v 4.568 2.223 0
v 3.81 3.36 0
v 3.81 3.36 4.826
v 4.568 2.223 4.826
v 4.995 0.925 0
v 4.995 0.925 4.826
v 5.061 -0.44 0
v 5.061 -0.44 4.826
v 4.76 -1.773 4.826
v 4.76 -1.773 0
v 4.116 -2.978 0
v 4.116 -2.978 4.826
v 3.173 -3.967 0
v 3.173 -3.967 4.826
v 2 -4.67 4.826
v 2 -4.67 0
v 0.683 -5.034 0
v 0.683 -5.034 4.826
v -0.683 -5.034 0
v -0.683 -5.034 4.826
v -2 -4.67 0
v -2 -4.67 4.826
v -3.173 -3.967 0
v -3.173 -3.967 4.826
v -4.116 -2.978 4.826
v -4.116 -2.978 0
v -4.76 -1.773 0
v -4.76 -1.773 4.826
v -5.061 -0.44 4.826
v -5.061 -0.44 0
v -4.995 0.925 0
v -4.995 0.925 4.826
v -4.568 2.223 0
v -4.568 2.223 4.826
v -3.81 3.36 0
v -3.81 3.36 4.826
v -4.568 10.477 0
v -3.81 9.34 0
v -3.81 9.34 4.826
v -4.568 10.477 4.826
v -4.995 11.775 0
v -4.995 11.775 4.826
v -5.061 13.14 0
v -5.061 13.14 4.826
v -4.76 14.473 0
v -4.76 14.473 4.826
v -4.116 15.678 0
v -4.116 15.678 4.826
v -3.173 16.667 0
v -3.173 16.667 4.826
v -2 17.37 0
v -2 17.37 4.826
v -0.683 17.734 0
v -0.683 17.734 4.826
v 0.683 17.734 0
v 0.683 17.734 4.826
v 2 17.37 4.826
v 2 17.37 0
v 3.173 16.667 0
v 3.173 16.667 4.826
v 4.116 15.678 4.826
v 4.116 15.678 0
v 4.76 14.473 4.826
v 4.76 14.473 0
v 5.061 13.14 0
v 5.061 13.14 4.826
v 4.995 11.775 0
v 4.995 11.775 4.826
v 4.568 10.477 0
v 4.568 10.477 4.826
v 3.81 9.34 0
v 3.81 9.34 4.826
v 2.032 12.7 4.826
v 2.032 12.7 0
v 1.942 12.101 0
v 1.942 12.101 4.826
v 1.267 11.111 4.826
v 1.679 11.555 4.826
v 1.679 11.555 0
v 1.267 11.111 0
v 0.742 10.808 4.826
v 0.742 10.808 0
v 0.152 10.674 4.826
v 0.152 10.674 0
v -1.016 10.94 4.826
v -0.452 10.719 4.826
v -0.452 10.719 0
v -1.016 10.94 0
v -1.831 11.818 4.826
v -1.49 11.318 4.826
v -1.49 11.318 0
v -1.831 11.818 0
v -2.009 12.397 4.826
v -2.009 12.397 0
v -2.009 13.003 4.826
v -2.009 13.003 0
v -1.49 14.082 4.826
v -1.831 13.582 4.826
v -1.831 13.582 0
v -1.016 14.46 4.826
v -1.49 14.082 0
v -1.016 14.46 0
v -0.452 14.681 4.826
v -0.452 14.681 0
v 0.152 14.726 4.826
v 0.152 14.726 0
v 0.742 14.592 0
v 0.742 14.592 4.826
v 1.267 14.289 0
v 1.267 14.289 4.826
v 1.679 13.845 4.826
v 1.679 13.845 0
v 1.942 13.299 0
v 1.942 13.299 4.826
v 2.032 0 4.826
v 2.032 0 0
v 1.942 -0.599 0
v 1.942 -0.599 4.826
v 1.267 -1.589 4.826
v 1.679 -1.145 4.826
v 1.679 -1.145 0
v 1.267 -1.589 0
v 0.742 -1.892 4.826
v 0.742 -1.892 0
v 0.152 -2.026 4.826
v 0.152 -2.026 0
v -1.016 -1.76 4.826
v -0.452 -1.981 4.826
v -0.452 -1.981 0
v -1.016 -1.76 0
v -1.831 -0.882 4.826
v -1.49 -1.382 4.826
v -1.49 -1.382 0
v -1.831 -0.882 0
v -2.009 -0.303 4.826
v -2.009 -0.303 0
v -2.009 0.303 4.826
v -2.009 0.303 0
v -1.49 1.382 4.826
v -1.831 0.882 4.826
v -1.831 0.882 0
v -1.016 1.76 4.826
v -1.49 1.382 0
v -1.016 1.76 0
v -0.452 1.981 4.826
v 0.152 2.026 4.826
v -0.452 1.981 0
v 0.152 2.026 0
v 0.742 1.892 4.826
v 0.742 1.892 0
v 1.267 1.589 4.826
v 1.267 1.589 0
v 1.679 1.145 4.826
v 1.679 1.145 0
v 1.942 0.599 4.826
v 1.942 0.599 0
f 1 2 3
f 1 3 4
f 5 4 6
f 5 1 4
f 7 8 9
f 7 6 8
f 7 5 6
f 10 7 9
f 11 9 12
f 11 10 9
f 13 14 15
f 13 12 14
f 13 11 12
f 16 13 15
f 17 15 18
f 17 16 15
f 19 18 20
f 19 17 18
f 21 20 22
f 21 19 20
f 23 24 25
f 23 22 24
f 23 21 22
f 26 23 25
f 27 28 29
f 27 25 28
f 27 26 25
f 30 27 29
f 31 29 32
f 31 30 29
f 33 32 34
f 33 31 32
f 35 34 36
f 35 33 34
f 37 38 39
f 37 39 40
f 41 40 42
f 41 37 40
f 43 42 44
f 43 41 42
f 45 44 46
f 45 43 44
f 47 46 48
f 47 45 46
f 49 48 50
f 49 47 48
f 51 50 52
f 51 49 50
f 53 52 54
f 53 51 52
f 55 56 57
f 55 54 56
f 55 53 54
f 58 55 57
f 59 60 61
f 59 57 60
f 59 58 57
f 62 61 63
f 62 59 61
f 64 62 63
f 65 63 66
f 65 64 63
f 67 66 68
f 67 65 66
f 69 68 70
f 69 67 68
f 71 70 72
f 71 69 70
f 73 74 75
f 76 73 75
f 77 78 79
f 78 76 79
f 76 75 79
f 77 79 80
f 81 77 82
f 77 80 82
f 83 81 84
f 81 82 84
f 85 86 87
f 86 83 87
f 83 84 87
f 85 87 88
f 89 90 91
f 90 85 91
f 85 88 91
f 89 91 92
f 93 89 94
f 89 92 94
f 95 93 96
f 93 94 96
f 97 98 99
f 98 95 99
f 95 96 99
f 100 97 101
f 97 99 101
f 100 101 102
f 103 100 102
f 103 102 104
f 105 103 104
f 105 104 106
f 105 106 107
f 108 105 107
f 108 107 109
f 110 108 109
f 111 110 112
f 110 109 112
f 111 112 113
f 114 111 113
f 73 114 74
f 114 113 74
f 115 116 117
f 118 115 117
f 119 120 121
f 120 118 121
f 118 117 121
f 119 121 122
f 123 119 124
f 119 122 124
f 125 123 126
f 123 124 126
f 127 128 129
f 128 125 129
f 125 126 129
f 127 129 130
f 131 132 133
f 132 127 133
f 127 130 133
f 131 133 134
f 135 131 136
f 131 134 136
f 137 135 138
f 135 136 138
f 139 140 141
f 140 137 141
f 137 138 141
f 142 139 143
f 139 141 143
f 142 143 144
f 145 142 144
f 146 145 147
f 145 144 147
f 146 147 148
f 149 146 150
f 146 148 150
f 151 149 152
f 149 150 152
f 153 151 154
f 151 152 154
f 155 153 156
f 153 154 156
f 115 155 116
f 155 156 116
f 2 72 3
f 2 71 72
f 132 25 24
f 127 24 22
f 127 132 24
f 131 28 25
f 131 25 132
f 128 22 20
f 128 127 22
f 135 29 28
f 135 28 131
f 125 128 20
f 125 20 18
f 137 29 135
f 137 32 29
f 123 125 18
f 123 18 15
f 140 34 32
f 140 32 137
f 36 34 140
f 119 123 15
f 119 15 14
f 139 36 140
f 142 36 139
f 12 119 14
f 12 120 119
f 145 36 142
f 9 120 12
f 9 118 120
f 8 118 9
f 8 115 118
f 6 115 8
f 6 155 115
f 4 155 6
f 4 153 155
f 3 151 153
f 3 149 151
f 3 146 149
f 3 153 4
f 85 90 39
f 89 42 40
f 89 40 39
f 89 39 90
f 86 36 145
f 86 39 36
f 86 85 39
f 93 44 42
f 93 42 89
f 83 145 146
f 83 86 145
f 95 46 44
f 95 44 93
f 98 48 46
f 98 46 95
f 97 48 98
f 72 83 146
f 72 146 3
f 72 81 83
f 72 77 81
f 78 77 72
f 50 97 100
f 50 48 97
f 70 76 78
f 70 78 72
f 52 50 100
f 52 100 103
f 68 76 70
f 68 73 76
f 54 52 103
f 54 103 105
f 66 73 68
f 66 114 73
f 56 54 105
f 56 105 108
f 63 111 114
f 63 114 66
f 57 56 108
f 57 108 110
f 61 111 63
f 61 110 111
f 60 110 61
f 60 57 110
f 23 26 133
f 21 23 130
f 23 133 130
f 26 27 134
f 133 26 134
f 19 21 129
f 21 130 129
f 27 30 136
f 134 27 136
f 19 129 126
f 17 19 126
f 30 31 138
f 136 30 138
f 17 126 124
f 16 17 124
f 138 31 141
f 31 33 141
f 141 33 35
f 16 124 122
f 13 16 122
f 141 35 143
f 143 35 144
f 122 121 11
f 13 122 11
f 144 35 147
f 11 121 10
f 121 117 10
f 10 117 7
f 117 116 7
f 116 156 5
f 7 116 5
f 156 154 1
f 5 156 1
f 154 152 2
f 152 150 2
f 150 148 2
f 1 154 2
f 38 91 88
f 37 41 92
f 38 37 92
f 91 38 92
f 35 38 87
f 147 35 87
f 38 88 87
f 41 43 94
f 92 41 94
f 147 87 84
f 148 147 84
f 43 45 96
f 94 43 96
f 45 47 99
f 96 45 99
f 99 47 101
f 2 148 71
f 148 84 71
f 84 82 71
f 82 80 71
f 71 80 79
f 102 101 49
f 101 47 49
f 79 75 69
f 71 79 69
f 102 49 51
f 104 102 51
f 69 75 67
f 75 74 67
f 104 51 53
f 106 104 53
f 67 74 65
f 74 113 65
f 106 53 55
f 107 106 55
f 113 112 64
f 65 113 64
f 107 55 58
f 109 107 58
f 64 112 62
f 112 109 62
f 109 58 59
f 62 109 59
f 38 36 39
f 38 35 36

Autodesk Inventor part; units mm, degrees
ref_plane "YZ Plane" through (0, 0, 0) normal (1, 0, 0) x (0, 1, 0)
ref_plane "XZ Plane" through (0, 0, 0) normal (0, 1, 0) x (-1, 0, 0)
ref_plane "XY Plane" through (0, 0, 0) normal (0, 0, 1) x (1, 0, 0)
sketch "Sketch1" plane through (0, 0, 0) normal (0, 0, 1) x (1, 0, 0)
  circle A0 centre (0, 0) radius 2.032
  arc A1 (-3.81, 3.3601) -> (3.81, 3.3601) centre (0, 0) ccw
  line L0 (-3.81, 3.3601) -> (-3.81, 9.3399)
  circle A2 centre (0, 12.7) radius 2.032
  arc A3 (3.81, 9.3399) -> (-3.81, 9.3399) centre (0, 12.7) ccw
  line L1 (3.81, 9.3399) -> (3.81, 3.3601)
  point P0 (-3.81, 6.35)
  dimension "d0" = 4.064
  dimension "d1" = 10.16
  dimension "d3" = 4.064
  dimension "d5" = 12.7
  dimension "d31" = 5.08
  dimension "d34" = 7.62
  dimension "d35" = 3.81
extrude "Extrusion1" add sketch "Sketch1" along normal blind 4.826
equation "\"d0\" = d3"
equation "\"d35\" = 0.5 * d34"
properties part number "Arm 1"
